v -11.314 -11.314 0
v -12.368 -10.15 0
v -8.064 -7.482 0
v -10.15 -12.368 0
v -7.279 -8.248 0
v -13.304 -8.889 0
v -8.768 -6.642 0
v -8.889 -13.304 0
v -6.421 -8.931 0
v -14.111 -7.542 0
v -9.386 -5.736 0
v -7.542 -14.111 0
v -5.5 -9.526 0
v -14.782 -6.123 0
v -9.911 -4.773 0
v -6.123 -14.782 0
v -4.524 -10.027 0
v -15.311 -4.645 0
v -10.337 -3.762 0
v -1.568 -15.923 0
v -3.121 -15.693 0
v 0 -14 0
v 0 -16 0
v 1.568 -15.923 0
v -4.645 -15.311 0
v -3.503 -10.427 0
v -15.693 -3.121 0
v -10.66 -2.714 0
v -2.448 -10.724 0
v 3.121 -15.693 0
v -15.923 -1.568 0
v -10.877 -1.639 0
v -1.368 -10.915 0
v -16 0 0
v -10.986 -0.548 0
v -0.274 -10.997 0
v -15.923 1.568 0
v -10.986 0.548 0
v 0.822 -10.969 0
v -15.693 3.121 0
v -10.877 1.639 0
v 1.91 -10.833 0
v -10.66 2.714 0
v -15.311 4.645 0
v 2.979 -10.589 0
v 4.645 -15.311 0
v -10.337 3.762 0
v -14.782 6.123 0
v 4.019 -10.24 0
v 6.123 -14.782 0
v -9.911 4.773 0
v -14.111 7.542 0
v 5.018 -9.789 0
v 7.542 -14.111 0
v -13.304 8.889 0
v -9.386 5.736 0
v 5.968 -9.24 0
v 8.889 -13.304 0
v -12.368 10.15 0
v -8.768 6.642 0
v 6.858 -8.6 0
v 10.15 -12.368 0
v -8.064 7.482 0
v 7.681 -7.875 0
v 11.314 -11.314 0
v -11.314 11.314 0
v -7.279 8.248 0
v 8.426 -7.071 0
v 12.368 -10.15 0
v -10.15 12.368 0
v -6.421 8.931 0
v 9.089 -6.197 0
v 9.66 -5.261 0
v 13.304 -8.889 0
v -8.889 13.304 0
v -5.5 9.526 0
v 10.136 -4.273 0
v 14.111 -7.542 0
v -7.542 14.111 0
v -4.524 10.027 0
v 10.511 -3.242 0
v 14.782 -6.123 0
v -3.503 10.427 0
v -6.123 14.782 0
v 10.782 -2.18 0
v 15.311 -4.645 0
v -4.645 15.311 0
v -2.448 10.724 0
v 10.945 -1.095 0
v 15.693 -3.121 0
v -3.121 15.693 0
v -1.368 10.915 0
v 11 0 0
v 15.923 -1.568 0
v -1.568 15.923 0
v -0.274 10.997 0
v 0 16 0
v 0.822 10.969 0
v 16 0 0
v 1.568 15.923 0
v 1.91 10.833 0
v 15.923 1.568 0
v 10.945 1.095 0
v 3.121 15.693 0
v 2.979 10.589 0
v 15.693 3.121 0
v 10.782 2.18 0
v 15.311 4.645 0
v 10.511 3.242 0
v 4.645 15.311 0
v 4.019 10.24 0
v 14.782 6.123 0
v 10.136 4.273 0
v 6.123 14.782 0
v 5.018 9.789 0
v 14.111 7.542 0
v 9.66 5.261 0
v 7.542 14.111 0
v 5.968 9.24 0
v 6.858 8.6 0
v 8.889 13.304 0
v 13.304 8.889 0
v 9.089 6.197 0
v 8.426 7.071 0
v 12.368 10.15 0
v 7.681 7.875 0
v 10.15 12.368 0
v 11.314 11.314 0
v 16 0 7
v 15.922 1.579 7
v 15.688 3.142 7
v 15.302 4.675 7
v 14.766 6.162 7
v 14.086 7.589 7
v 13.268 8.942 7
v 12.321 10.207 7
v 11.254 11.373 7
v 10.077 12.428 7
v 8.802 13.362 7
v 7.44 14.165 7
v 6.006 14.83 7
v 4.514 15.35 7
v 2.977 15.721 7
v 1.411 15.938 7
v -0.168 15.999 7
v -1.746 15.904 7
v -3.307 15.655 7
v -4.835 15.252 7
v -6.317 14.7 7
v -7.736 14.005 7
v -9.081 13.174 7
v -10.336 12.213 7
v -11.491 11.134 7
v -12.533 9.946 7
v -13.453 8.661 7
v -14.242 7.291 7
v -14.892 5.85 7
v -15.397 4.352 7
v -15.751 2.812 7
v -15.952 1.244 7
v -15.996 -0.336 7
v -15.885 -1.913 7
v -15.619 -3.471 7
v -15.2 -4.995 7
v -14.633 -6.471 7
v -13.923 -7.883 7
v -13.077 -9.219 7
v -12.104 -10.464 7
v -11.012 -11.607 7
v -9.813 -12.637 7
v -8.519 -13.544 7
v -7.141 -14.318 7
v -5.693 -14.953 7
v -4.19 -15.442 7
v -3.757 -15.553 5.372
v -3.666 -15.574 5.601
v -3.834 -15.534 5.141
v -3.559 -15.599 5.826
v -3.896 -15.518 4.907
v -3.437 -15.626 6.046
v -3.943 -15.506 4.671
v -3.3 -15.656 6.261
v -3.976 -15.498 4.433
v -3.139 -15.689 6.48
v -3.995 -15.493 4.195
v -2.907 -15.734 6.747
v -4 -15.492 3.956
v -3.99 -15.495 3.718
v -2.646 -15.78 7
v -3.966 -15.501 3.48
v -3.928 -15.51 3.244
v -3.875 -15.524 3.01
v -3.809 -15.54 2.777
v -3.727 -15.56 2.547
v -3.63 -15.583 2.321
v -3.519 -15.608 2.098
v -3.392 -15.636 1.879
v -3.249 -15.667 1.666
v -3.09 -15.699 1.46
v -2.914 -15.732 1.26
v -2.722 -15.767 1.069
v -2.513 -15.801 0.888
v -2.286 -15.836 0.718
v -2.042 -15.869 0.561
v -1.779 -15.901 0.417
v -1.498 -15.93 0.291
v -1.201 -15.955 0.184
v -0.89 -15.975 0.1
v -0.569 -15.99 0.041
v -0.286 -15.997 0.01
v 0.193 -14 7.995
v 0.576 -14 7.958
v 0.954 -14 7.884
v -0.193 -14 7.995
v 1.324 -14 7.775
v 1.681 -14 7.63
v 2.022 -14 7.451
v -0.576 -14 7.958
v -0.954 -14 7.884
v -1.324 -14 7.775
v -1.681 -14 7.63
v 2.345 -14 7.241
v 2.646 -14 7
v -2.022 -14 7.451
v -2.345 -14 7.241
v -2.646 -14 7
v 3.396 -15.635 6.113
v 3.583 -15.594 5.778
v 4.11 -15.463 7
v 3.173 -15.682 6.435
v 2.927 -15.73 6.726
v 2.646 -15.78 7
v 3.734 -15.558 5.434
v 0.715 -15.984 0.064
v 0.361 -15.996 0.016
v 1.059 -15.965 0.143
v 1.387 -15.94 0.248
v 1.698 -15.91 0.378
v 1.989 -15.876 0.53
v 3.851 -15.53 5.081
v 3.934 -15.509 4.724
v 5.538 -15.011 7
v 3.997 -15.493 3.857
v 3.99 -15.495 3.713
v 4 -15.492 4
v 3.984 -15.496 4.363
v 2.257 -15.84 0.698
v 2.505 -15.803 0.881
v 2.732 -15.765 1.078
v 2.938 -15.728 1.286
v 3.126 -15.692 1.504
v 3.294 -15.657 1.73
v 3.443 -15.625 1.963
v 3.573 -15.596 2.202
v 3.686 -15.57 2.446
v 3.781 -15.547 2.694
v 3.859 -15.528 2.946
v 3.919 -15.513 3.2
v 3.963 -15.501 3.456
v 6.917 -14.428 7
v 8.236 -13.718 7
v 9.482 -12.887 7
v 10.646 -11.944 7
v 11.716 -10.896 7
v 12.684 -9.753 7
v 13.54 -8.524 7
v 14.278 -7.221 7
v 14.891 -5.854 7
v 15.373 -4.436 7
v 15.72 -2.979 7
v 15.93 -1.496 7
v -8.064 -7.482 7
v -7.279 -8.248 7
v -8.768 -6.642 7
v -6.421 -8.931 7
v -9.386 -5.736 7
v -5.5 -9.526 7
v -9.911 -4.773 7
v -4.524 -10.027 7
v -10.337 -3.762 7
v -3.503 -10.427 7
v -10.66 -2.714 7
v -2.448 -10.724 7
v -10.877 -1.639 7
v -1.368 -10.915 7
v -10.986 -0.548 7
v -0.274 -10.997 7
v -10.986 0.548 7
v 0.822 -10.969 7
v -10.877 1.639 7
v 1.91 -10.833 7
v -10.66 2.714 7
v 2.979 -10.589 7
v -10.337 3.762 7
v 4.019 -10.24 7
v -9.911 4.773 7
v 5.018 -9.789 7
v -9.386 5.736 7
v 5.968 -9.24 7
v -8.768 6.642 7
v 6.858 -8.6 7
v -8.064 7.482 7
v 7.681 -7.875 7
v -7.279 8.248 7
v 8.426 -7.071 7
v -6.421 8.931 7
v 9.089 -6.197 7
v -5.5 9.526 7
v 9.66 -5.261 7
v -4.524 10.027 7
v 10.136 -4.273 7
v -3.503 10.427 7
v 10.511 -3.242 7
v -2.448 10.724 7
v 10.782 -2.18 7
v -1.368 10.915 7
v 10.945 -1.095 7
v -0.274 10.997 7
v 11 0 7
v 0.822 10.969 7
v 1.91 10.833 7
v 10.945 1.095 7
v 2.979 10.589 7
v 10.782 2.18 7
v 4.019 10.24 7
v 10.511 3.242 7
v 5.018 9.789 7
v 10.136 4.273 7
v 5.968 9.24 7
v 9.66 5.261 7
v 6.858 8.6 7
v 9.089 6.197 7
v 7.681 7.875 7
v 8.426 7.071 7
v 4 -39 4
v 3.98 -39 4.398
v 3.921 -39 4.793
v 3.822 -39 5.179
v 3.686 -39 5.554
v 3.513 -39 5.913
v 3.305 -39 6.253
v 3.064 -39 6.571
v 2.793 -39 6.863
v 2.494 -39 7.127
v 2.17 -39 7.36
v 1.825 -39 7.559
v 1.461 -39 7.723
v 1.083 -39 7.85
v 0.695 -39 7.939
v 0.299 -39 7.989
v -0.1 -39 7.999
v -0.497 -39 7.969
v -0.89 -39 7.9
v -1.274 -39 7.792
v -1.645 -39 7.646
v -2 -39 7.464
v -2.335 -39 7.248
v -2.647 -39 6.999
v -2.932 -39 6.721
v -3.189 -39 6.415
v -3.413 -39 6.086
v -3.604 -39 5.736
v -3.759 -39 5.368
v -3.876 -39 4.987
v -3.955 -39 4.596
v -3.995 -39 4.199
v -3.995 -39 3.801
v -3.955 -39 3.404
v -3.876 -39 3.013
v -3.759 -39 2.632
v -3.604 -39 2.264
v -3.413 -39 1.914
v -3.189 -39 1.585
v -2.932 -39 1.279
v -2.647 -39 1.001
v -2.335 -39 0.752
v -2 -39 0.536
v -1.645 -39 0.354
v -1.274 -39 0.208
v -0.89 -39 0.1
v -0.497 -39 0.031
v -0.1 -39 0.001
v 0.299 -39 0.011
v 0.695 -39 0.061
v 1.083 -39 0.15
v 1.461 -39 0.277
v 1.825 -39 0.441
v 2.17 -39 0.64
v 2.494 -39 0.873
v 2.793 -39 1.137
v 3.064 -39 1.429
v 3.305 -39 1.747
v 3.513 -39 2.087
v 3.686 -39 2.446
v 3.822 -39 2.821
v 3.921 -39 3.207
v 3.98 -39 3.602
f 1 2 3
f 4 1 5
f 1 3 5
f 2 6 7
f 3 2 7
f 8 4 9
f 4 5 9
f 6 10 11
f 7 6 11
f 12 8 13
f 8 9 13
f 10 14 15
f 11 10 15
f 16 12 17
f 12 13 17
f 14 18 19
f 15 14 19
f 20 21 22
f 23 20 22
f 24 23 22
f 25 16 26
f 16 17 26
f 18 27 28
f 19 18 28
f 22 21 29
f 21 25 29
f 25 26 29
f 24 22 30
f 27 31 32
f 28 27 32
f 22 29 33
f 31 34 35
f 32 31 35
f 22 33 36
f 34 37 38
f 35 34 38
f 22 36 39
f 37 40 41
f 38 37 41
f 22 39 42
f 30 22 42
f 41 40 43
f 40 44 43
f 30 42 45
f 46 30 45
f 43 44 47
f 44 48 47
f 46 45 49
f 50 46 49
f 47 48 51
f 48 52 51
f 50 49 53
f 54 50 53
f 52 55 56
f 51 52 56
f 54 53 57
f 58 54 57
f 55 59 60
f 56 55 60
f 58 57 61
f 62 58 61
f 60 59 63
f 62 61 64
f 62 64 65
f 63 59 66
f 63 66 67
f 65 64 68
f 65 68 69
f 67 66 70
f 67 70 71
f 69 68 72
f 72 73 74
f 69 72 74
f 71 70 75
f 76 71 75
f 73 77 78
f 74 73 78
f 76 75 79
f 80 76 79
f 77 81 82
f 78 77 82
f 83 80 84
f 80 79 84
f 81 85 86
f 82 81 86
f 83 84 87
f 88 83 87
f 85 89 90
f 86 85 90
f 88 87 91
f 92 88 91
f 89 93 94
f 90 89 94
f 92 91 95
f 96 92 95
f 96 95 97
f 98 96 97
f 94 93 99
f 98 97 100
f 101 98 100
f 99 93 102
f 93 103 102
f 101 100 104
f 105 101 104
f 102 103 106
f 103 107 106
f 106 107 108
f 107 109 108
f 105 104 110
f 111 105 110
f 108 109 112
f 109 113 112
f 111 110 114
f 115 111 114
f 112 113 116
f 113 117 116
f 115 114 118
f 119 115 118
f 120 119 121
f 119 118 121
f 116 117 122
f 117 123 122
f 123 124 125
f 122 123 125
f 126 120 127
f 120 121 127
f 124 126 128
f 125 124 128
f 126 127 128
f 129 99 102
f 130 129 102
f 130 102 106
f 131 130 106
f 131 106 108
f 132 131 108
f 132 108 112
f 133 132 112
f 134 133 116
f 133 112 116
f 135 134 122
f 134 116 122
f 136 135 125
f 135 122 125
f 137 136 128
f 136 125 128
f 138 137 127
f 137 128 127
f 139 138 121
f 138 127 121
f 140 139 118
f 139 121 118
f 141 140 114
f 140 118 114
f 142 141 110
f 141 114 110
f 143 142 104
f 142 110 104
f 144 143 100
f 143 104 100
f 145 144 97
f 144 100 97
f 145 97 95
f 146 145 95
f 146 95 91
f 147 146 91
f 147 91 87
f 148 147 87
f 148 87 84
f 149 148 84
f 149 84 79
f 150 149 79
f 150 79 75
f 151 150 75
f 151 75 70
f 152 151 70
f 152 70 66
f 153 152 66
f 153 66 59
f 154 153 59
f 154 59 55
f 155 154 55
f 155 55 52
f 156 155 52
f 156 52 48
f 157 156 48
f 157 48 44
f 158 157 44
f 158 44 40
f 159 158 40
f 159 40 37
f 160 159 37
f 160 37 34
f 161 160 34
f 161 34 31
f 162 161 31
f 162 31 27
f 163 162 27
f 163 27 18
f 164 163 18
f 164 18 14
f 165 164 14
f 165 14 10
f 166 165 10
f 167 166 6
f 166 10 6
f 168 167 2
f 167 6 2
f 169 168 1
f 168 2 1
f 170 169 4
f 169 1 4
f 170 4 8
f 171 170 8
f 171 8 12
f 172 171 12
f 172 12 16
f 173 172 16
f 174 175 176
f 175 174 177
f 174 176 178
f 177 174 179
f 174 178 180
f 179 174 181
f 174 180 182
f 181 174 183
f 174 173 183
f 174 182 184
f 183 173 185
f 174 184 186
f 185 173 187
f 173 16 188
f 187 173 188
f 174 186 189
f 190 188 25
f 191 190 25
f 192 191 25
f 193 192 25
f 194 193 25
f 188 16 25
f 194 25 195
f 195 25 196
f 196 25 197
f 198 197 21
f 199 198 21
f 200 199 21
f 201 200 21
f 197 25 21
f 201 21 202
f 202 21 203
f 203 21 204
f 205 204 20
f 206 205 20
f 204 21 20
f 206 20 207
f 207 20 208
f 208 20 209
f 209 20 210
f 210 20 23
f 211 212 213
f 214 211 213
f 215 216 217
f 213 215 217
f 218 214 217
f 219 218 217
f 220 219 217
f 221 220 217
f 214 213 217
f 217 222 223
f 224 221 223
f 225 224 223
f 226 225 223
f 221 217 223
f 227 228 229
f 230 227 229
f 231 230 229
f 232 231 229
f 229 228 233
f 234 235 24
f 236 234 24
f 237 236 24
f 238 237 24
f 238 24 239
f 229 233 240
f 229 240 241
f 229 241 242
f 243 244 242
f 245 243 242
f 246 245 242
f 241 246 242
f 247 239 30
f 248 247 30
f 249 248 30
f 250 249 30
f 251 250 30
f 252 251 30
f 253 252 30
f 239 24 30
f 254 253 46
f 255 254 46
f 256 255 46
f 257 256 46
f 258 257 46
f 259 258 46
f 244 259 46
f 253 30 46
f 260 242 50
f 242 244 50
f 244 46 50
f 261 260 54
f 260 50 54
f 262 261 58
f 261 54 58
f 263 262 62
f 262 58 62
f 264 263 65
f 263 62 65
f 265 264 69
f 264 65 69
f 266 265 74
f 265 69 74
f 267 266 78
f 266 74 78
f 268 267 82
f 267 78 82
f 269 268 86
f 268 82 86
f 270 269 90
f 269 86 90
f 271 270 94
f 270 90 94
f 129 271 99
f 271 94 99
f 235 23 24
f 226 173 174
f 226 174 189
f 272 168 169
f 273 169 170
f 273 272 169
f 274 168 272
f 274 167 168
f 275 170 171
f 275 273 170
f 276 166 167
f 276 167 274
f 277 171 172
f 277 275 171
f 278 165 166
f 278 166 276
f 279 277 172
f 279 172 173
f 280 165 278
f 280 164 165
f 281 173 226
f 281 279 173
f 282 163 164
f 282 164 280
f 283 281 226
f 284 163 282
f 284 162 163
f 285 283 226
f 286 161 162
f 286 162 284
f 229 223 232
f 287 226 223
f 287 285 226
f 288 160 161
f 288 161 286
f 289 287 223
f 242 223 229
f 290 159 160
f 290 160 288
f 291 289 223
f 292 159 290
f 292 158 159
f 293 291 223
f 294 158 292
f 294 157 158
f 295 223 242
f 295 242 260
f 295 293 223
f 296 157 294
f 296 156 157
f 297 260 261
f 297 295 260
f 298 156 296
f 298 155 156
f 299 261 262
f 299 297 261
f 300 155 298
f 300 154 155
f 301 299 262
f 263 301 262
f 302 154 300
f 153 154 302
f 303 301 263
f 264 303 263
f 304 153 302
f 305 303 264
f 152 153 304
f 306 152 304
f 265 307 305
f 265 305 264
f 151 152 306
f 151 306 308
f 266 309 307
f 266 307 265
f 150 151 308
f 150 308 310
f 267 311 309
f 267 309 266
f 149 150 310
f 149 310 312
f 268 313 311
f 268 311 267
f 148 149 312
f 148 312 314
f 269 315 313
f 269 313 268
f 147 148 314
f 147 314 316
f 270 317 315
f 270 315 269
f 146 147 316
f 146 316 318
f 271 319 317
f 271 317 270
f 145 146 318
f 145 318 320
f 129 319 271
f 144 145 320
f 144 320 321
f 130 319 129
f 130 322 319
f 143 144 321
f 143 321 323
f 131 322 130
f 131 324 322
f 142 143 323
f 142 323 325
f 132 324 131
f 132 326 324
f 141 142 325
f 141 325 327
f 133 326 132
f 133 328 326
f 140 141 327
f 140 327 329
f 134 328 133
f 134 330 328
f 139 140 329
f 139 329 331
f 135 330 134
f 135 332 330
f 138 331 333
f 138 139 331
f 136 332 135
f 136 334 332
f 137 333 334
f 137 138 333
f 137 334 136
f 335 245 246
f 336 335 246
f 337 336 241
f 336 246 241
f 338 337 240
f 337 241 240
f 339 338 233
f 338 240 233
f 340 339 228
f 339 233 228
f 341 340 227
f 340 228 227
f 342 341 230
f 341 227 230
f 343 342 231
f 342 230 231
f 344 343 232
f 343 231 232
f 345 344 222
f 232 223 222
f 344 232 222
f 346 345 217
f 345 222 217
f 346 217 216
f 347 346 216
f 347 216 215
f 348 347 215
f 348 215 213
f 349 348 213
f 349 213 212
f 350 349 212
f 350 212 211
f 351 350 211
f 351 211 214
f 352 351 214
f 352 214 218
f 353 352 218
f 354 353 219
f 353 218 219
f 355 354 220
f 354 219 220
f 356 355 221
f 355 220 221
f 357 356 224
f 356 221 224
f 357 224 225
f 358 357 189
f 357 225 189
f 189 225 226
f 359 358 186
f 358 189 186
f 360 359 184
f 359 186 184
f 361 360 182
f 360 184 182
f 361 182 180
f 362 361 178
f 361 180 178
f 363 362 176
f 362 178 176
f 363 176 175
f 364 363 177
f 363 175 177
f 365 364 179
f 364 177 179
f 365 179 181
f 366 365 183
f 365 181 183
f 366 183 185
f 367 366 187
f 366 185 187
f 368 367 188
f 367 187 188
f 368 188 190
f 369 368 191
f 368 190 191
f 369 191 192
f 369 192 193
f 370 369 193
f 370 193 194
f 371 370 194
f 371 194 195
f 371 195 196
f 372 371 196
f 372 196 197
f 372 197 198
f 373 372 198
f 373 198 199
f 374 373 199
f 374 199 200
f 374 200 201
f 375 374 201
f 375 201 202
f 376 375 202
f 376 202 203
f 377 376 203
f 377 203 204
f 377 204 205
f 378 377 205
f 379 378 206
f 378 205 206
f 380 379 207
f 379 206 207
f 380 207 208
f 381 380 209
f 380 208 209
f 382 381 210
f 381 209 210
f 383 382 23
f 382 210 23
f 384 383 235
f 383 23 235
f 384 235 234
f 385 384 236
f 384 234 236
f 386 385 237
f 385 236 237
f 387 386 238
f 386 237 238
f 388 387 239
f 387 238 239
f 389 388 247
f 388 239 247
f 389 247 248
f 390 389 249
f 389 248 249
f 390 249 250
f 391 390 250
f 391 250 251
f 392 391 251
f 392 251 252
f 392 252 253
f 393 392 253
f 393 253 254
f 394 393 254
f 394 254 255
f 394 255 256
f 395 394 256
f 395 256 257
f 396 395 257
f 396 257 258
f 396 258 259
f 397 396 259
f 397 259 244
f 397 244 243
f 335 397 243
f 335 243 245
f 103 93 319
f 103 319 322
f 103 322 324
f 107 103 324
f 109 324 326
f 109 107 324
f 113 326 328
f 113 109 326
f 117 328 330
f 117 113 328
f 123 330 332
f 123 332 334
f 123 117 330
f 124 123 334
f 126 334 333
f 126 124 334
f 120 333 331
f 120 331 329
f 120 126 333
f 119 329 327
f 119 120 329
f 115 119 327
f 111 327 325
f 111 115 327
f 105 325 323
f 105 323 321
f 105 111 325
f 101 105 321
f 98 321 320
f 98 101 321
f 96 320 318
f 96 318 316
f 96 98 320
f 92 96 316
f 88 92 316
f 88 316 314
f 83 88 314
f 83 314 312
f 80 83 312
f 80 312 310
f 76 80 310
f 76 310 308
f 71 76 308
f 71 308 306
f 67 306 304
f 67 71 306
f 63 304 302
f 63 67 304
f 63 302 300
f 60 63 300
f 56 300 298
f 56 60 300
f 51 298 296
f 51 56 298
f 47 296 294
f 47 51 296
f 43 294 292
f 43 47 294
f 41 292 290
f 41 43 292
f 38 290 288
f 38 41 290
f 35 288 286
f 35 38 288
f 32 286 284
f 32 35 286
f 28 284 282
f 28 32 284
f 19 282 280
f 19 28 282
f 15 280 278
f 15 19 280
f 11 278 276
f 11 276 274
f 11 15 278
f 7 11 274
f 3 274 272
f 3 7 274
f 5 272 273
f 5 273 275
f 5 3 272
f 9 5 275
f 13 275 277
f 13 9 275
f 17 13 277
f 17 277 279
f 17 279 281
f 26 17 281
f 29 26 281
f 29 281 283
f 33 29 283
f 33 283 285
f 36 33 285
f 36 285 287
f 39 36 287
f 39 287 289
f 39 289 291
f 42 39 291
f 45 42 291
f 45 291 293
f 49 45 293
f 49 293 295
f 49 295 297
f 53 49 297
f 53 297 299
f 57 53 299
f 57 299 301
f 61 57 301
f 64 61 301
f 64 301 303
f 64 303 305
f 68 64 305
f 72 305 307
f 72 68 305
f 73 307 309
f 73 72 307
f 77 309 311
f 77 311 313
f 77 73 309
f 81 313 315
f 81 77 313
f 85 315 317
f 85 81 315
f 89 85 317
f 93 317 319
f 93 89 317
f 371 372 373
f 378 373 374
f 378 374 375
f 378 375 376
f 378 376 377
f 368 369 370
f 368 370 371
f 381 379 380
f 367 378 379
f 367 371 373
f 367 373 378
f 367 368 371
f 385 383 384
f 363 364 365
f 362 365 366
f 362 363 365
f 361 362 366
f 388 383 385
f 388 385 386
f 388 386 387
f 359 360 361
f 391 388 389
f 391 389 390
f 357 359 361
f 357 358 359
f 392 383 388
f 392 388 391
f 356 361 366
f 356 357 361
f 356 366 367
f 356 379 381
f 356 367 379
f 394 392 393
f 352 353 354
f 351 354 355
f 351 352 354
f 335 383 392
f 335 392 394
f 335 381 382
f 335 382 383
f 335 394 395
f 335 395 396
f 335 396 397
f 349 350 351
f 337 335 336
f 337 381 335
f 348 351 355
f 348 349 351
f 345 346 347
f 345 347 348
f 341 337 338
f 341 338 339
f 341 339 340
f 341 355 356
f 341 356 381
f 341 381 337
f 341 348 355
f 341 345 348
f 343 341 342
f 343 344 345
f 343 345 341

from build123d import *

# Parameters (mm, degrees)
SKETCH_R     = 16
SKETCH_R_2   = 11
PAD_DEPTH    = 7
SKETCH001_R  = 4
PAD001_DEPTH = 25


with BuildPart() as part:
    # Sketch → Pad (new body)
    with BuildSketch(Plane.XY):
        Circle(SKETCH_R)
        Circle(SKETCH_R_2, mode=Mode.SUBTRACT)
    extrude(amount=PAD_DEPTH)

    # Sketch001 → Pad001 (join)
    with BuildSketch(Plane.XZ.offset(14)):
        with Locations((0, 4)):
            Circle(SKETCH001_R)
    extrude(amount=PAD001_DEPTH)


solid = part.part
